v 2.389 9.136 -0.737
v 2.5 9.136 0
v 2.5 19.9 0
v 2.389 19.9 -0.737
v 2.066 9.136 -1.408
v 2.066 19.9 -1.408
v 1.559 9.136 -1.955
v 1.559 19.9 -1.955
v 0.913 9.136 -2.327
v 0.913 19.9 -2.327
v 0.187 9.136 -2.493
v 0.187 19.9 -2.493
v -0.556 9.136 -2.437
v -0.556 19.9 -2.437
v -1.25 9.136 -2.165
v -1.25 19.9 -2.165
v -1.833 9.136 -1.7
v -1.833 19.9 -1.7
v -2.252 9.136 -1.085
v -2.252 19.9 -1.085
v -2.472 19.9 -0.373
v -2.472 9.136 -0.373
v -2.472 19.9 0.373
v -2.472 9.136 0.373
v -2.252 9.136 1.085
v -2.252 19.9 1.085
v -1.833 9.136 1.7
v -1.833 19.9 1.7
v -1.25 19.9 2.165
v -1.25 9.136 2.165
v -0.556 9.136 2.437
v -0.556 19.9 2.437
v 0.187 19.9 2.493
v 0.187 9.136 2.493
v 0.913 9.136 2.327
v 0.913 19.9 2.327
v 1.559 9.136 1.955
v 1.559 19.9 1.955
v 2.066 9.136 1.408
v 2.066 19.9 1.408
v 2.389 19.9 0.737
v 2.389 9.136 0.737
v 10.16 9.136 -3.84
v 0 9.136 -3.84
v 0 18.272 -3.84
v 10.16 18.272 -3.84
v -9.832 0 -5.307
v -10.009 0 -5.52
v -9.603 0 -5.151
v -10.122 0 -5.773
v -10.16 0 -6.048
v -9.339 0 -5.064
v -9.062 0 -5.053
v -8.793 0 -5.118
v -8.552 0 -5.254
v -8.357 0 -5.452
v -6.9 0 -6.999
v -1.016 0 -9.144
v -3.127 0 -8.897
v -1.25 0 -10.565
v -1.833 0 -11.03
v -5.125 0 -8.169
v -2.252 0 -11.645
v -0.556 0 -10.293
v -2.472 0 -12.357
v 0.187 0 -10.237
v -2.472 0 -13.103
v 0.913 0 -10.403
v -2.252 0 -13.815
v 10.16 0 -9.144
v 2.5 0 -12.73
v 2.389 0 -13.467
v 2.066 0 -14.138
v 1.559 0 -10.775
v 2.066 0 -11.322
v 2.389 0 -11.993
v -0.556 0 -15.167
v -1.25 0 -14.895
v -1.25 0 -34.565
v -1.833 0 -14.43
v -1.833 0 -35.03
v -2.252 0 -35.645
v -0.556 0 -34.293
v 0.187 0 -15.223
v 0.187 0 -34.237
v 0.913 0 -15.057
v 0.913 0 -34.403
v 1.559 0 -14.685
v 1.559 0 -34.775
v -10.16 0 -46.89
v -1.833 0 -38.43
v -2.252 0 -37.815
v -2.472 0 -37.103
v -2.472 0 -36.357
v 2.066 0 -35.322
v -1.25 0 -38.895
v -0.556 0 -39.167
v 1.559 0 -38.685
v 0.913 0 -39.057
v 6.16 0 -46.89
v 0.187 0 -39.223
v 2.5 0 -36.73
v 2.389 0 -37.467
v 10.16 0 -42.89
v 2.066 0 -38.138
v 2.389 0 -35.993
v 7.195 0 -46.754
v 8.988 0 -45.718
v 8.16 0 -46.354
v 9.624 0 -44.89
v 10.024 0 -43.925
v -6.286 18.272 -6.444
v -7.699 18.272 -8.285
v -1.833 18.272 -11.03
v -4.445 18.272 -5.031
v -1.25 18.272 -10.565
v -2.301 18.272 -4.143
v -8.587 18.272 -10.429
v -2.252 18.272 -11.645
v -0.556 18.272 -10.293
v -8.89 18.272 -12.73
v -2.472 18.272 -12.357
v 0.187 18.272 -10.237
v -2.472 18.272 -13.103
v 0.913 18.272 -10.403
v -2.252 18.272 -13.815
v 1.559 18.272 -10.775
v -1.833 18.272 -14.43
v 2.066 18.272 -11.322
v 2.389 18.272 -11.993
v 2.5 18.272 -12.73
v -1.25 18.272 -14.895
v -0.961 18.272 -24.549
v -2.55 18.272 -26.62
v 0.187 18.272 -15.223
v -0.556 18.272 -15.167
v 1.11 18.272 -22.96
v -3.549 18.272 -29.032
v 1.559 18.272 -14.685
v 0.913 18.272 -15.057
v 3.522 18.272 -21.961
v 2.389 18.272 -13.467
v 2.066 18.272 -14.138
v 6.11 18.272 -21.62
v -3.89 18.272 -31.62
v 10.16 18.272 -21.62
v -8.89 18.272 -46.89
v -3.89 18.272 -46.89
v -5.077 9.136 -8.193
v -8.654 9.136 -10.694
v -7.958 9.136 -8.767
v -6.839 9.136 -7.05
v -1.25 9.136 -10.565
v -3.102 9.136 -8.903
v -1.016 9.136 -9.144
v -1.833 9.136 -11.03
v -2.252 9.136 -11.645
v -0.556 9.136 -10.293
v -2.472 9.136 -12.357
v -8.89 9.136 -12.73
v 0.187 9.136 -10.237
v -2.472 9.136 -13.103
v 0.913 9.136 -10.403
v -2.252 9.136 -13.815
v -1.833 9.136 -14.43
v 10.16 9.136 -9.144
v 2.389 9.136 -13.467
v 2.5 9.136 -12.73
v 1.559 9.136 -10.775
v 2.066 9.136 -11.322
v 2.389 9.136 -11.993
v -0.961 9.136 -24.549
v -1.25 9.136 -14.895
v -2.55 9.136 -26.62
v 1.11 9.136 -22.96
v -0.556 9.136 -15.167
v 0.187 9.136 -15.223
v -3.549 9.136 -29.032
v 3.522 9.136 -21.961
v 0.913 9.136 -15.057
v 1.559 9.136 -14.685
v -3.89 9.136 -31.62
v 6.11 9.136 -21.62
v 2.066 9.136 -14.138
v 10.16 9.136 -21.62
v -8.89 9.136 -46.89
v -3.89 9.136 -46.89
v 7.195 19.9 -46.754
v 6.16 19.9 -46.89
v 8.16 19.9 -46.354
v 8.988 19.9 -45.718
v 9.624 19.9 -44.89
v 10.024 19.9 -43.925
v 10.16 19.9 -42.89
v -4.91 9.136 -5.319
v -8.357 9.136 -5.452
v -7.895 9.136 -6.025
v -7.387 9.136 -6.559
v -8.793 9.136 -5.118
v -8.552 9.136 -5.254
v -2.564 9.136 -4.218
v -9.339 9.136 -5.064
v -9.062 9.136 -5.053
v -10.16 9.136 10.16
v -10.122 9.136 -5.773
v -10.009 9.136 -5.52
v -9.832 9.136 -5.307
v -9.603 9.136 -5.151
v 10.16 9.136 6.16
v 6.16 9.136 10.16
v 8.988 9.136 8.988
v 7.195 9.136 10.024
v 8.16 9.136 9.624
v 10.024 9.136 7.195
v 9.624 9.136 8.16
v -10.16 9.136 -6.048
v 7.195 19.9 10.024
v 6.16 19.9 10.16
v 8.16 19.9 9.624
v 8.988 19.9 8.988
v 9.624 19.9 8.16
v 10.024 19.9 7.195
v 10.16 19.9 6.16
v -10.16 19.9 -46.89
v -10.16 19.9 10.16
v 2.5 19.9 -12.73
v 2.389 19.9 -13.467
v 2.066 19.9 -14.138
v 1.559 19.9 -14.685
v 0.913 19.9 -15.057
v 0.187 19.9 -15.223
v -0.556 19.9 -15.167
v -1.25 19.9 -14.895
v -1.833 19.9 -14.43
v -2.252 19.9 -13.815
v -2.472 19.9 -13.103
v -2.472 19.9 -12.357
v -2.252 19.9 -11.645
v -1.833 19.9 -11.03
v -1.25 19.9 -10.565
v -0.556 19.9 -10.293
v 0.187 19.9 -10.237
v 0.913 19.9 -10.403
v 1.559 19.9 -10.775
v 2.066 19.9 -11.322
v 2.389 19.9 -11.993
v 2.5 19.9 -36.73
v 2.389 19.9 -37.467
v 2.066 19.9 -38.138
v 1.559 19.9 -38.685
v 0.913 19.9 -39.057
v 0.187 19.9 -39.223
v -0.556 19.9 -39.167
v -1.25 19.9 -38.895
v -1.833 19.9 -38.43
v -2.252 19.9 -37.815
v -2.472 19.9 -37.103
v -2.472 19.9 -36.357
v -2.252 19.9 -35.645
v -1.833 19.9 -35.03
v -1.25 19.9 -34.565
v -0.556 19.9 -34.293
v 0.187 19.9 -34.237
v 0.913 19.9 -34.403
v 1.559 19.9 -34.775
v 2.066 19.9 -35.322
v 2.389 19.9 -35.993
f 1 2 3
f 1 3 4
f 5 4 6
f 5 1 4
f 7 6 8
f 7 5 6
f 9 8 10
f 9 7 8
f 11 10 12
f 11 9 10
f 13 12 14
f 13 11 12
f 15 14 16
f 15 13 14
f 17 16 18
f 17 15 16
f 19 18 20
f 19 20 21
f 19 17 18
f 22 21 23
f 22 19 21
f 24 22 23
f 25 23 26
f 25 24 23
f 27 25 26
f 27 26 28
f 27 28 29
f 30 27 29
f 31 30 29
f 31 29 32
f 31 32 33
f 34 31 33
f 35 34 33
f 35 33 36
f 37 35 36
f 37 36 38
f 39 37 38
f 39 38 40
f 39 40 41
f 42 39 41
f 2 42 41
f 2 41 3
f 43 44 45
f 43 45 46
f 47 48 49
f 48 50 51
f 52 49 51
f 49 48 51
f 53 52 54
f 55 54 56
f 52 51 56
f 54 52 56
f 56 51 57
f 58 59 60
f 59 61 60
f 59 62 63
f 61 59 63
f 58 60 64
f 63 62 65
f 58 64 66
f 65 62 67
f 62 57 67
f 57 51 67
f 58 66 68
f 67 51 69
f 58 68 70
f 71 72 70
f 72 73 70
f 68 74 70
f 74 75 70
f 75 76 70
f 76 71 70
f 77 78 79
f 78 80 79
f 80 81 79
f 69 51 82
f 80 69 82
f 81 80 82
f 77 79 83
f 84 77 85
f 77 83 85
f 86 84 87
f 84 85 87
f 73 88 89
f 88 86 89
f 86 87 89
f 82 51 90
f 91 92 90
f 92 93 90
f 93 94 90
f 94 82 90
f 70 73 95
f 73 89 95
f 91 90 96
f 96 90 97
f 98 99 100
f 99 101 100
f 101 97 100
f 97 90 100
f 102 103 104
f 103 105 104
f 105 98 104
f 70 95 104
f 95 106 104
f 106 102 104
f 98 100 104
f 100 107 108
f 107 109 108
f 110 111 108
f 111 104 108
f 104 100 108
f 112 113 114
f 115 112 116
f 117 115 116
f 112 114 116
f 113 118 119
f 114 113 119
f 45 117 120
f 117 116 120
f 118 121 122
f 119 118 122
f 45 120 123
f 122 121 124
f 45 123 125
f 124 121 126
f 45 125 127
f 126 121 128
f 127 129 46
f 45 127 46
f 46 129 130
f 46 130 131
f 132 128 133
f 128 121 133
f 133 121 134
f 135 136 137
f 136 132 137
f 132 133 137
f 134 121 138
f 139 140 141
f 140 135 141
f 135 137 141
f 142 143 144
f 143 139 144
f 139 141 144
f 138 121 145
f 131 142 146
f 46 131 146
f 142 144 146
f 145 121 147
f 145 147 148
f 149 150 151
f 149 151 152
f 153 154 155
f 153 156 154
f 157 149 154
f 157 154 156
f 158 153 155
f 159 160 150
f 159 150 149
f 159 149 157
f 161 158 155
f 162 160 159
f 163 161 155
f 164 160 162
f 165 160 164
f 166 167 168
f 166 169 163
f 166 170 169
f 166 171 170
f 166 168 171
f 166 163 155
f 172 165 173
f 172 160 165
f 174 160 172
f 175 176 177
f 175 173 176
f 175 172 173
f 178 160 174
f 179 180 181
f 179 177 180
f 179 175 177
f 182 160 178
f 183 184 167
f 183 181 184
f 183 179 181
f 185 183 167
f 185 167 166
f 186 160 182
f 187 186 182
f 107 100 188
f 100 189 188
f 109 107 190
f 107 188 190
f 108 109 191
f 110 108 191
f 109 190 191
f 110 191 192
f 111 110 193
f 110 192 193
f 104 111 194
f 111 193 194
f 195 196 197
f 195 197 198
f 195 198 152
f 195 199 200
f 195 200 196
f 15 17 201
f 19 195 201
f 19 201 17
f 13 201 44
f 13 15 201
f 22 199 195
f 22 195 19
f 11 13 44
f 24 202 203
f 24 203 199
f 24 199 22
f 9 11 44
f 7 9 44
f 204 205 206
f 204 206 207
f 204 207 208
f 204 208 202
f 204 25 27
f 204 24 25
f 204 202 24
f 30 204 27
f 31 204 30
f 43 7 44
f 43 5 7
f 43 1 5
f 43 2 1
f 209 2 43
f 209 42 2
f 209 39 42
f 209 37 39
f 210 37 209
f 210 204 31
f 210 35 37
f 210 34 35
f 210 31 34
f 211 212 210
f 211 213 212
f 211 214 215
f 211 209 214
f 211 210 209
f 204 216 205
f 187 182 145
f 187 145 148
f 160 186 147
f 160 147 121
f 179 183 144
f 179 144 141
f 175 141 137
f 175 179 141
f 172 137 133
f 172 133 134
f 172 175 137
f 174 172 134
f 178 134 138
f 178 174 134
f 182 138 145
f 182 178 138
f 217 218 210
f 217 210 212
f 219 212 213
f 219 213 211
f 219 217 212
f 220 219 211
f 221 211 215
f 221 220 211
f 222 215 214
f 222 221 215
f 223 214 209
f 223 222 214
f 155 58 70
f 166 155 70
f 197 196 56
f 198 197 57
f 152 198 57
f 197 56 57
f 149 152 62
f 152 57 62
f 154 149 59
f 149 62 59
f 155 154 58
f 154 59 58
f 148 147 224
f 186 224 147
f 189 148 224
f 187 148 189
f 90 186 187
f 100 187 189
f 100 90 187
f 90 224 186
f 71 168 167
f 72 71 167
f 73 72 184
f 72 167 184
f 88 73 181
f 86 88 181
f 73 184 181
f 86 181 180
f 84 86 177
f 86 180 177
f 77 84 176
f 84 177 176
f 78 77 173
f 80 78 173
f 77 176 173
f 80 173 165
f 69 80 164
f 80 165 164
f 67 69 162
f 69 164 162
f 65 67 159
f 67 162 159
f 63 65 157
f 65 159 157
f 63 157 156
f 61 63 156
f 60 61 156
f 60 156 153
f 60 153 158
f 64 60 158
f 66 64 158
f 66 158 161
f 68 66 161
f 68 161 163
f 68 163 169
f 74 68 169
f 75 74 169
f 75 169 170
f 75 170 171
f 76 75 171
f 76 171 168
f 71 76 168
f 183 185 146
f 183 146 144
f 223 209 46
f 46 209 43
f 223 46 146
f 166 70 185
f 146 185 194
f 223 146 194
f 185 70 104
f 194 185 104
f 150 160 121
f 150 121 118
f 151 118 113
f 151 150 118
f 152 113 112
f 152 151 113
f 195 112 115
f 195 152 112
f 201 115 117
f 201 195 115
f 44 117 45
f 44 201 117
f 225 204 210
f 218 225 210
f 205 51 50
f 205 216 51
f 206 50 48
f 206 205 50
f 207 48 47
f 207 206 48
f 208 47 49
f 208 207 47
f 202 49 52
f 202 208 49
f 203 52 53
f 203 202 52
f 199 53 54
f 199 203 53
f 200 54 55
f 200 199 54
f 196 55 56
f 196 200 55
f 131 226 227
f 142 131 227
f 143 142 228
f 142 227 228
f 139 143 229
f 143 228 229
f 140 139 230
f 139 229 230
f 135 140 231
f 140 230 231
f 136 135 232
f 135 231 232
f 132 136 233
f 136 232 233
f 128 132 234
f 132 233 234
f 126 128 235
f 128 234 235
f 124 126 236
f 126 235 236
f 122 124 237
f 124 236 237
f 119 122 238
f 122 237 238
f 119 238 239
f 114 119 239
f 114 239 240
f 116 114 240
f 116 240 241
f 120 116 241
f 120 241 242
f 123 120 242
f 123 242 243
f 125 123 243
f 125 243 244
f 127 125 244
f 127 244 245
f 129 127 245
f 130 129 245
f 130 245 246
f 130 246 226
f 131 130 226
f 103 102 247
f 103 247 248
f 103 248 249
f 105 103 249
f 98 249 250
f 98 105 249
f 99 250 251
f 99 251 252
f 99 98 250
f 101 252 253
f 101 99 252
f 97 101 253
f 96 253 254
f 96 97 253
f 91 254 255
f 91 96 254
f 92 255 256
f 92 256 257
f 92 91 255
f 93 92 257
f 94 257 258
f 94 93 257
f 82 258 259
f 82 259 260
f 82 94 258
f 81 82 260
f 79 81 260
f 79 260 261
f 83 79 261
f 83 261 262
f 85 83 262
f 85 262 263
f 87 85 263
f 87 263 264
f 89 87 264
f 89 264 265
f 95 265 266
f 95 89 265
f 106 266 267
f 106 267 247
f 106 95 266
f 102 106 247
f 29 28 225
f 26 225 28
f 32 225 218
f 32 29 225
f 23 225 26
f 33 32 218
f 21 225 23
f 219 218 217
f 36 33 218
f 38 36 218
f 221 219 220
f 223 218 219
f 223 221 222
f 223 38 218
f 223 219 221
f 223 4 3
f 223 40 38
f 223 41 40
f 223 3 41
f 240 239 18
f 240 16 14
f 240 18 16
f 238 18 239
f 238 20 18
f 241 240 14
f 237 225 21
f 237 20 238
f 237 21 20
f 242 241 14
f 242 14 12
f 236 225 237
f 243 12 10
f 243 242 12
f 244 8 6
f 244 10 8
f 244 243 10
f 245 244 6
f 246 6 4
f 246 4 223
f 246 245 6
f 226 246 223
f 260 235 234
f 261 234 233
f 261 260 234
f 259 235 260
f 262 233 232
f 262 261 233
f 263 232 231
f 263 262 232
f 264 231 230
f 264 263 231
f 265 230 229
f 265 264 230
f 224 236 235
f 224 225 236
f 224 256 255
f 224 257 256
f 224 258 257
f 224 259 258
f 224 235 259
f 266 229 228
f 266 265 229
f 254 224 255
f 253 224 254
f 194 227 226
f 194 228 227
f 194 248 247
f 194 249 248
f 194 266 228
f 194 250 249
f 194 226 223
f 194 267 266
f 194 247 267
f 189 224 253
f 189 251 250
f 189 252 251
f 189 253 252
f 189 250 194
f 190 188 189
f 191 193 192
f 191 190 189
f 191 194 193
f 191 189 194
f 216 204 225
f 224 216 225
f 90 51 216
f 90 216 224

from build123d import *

# Parameters (mm, degrees)
SKETCH1_W           = 20.32
SKETCH1_H           = 57.05
SKETCH1_R           = 2.5
BOSS_EXTRUDE1_DEPTH = 19.9
FILLET1_R           = 4
CUT_EXTRUDE1_DEPTH  = 9.136
SKETCH3_R           = 2.5
CUT_EXTRUDE2_DEPTH  = 20.9
CUT_EXTRUDE3_START  = -10.764
CUT_EXTRUDE3_DEPTH  = 9.136
FILLET2_R           = 1


with BuildPart() as part:
    # Sketch1 → Boss-Extrude1 (new body)
    with BuildSketch(Plane(origin=(0, 0, 0), x_dir=(1, 0, 0), z_dir=(0, 1, 0))):
        with Locations((0, 18.365)):
            Rectangle(SKETCH1_W, SKETCH1_H)
        Circle(SKETCH1_R, mode=Mode.SUBTRACT)
        with Locations((0, 36.73)):
            Circle(SKETCH1_R, mode=Mode.SUBTRACT)
    extrude(amount=BOSS_EXTRUDE1_DEPTH)

    # Fillet1
    fillet1_edges = [part.edges().sort_by_distance(p)[0] for p in [
        (10.16, 9.95, 10.16),
        (10.16, 9.95, -46.89),
    ]]
    fillet(fillet1_edges, radius=FILLET1_R)

    # Sketch2 → Cut-Extrude1 (cut)
    with BuildSketch(Plane.XZ):
        with BuildLine():
            Line((-1.016, -9.144), (10.16, -9.144))
            Line((10.16, -9.144), (10.16, 10.16))
            Line((10.16, 10.16), (-10.16, 10.16))
            Line((-10.16, 10.16), (-10.16, 0))
            ThreePointArc((-10.16, 0), (-7.481784407, -6.465784407), (-1.016, -9.144))
        make_face()
    extrude(amount=-CUT_EXTRUDE1_DEPTH, mode=Mode.SUBTRACT)

    # Sketch3 → Cut-Extrude2 (cut, through all)
    with BuildSketch(Plane(origin=(0, 19.9, 0), x_dir=(1, 0, 0), z_dir=(0, 1, 0))):
        with Locations((0, 12.73)):
            Circle(SKETCH3_R)
    extrude(amount=-CUT_EXTRUDE2_DEPTH, mode=Mode.SUBTRACT)

    # Sketch4 → Cut-Extrude3 (cut)
    with BuildSketch(Plane(origin=(0, 19.9, 0), x_dir=(1, 0, 0), z_dir=(0, 1, 0)).offset(CUT_EXTRUDE3_START)):
        with BuildLine():
            Line((0, 3.84), (10.16, 3.84))
            Line((10.16, 3.84), (10.16, 21.62))
            Line((10.16, 21.62), (6.11, 21.62))
            ThreePointArc((6.11, 21.62), (-0.961067812, 24.548932188), (-3.89, 31.62))
            Line((-3.89, 31.62), (-3.89, 46.89))
            Line((-3.89, 46.89), (-8.89, 46.89))
            Line((-8.89, 46.89), (-8.89, 12.73))
            ThreePointArc((-8.89, 12.73), (-6.286179285, 6.443820715), (0, 3.84))
        make_face()
    extrude(amount=CUT_EXTRUDE3_DEPTH, mode=Mode.SUBTRACT)

    # Fillet2
    fillet2_edges = [part.edges().sort_by_distance(p)[0] for p in [
        (-10.16, 4.568, 0),
    ]]
    fillet(fillet2_edges, radius=FILLET2_R)


solid = part.part
